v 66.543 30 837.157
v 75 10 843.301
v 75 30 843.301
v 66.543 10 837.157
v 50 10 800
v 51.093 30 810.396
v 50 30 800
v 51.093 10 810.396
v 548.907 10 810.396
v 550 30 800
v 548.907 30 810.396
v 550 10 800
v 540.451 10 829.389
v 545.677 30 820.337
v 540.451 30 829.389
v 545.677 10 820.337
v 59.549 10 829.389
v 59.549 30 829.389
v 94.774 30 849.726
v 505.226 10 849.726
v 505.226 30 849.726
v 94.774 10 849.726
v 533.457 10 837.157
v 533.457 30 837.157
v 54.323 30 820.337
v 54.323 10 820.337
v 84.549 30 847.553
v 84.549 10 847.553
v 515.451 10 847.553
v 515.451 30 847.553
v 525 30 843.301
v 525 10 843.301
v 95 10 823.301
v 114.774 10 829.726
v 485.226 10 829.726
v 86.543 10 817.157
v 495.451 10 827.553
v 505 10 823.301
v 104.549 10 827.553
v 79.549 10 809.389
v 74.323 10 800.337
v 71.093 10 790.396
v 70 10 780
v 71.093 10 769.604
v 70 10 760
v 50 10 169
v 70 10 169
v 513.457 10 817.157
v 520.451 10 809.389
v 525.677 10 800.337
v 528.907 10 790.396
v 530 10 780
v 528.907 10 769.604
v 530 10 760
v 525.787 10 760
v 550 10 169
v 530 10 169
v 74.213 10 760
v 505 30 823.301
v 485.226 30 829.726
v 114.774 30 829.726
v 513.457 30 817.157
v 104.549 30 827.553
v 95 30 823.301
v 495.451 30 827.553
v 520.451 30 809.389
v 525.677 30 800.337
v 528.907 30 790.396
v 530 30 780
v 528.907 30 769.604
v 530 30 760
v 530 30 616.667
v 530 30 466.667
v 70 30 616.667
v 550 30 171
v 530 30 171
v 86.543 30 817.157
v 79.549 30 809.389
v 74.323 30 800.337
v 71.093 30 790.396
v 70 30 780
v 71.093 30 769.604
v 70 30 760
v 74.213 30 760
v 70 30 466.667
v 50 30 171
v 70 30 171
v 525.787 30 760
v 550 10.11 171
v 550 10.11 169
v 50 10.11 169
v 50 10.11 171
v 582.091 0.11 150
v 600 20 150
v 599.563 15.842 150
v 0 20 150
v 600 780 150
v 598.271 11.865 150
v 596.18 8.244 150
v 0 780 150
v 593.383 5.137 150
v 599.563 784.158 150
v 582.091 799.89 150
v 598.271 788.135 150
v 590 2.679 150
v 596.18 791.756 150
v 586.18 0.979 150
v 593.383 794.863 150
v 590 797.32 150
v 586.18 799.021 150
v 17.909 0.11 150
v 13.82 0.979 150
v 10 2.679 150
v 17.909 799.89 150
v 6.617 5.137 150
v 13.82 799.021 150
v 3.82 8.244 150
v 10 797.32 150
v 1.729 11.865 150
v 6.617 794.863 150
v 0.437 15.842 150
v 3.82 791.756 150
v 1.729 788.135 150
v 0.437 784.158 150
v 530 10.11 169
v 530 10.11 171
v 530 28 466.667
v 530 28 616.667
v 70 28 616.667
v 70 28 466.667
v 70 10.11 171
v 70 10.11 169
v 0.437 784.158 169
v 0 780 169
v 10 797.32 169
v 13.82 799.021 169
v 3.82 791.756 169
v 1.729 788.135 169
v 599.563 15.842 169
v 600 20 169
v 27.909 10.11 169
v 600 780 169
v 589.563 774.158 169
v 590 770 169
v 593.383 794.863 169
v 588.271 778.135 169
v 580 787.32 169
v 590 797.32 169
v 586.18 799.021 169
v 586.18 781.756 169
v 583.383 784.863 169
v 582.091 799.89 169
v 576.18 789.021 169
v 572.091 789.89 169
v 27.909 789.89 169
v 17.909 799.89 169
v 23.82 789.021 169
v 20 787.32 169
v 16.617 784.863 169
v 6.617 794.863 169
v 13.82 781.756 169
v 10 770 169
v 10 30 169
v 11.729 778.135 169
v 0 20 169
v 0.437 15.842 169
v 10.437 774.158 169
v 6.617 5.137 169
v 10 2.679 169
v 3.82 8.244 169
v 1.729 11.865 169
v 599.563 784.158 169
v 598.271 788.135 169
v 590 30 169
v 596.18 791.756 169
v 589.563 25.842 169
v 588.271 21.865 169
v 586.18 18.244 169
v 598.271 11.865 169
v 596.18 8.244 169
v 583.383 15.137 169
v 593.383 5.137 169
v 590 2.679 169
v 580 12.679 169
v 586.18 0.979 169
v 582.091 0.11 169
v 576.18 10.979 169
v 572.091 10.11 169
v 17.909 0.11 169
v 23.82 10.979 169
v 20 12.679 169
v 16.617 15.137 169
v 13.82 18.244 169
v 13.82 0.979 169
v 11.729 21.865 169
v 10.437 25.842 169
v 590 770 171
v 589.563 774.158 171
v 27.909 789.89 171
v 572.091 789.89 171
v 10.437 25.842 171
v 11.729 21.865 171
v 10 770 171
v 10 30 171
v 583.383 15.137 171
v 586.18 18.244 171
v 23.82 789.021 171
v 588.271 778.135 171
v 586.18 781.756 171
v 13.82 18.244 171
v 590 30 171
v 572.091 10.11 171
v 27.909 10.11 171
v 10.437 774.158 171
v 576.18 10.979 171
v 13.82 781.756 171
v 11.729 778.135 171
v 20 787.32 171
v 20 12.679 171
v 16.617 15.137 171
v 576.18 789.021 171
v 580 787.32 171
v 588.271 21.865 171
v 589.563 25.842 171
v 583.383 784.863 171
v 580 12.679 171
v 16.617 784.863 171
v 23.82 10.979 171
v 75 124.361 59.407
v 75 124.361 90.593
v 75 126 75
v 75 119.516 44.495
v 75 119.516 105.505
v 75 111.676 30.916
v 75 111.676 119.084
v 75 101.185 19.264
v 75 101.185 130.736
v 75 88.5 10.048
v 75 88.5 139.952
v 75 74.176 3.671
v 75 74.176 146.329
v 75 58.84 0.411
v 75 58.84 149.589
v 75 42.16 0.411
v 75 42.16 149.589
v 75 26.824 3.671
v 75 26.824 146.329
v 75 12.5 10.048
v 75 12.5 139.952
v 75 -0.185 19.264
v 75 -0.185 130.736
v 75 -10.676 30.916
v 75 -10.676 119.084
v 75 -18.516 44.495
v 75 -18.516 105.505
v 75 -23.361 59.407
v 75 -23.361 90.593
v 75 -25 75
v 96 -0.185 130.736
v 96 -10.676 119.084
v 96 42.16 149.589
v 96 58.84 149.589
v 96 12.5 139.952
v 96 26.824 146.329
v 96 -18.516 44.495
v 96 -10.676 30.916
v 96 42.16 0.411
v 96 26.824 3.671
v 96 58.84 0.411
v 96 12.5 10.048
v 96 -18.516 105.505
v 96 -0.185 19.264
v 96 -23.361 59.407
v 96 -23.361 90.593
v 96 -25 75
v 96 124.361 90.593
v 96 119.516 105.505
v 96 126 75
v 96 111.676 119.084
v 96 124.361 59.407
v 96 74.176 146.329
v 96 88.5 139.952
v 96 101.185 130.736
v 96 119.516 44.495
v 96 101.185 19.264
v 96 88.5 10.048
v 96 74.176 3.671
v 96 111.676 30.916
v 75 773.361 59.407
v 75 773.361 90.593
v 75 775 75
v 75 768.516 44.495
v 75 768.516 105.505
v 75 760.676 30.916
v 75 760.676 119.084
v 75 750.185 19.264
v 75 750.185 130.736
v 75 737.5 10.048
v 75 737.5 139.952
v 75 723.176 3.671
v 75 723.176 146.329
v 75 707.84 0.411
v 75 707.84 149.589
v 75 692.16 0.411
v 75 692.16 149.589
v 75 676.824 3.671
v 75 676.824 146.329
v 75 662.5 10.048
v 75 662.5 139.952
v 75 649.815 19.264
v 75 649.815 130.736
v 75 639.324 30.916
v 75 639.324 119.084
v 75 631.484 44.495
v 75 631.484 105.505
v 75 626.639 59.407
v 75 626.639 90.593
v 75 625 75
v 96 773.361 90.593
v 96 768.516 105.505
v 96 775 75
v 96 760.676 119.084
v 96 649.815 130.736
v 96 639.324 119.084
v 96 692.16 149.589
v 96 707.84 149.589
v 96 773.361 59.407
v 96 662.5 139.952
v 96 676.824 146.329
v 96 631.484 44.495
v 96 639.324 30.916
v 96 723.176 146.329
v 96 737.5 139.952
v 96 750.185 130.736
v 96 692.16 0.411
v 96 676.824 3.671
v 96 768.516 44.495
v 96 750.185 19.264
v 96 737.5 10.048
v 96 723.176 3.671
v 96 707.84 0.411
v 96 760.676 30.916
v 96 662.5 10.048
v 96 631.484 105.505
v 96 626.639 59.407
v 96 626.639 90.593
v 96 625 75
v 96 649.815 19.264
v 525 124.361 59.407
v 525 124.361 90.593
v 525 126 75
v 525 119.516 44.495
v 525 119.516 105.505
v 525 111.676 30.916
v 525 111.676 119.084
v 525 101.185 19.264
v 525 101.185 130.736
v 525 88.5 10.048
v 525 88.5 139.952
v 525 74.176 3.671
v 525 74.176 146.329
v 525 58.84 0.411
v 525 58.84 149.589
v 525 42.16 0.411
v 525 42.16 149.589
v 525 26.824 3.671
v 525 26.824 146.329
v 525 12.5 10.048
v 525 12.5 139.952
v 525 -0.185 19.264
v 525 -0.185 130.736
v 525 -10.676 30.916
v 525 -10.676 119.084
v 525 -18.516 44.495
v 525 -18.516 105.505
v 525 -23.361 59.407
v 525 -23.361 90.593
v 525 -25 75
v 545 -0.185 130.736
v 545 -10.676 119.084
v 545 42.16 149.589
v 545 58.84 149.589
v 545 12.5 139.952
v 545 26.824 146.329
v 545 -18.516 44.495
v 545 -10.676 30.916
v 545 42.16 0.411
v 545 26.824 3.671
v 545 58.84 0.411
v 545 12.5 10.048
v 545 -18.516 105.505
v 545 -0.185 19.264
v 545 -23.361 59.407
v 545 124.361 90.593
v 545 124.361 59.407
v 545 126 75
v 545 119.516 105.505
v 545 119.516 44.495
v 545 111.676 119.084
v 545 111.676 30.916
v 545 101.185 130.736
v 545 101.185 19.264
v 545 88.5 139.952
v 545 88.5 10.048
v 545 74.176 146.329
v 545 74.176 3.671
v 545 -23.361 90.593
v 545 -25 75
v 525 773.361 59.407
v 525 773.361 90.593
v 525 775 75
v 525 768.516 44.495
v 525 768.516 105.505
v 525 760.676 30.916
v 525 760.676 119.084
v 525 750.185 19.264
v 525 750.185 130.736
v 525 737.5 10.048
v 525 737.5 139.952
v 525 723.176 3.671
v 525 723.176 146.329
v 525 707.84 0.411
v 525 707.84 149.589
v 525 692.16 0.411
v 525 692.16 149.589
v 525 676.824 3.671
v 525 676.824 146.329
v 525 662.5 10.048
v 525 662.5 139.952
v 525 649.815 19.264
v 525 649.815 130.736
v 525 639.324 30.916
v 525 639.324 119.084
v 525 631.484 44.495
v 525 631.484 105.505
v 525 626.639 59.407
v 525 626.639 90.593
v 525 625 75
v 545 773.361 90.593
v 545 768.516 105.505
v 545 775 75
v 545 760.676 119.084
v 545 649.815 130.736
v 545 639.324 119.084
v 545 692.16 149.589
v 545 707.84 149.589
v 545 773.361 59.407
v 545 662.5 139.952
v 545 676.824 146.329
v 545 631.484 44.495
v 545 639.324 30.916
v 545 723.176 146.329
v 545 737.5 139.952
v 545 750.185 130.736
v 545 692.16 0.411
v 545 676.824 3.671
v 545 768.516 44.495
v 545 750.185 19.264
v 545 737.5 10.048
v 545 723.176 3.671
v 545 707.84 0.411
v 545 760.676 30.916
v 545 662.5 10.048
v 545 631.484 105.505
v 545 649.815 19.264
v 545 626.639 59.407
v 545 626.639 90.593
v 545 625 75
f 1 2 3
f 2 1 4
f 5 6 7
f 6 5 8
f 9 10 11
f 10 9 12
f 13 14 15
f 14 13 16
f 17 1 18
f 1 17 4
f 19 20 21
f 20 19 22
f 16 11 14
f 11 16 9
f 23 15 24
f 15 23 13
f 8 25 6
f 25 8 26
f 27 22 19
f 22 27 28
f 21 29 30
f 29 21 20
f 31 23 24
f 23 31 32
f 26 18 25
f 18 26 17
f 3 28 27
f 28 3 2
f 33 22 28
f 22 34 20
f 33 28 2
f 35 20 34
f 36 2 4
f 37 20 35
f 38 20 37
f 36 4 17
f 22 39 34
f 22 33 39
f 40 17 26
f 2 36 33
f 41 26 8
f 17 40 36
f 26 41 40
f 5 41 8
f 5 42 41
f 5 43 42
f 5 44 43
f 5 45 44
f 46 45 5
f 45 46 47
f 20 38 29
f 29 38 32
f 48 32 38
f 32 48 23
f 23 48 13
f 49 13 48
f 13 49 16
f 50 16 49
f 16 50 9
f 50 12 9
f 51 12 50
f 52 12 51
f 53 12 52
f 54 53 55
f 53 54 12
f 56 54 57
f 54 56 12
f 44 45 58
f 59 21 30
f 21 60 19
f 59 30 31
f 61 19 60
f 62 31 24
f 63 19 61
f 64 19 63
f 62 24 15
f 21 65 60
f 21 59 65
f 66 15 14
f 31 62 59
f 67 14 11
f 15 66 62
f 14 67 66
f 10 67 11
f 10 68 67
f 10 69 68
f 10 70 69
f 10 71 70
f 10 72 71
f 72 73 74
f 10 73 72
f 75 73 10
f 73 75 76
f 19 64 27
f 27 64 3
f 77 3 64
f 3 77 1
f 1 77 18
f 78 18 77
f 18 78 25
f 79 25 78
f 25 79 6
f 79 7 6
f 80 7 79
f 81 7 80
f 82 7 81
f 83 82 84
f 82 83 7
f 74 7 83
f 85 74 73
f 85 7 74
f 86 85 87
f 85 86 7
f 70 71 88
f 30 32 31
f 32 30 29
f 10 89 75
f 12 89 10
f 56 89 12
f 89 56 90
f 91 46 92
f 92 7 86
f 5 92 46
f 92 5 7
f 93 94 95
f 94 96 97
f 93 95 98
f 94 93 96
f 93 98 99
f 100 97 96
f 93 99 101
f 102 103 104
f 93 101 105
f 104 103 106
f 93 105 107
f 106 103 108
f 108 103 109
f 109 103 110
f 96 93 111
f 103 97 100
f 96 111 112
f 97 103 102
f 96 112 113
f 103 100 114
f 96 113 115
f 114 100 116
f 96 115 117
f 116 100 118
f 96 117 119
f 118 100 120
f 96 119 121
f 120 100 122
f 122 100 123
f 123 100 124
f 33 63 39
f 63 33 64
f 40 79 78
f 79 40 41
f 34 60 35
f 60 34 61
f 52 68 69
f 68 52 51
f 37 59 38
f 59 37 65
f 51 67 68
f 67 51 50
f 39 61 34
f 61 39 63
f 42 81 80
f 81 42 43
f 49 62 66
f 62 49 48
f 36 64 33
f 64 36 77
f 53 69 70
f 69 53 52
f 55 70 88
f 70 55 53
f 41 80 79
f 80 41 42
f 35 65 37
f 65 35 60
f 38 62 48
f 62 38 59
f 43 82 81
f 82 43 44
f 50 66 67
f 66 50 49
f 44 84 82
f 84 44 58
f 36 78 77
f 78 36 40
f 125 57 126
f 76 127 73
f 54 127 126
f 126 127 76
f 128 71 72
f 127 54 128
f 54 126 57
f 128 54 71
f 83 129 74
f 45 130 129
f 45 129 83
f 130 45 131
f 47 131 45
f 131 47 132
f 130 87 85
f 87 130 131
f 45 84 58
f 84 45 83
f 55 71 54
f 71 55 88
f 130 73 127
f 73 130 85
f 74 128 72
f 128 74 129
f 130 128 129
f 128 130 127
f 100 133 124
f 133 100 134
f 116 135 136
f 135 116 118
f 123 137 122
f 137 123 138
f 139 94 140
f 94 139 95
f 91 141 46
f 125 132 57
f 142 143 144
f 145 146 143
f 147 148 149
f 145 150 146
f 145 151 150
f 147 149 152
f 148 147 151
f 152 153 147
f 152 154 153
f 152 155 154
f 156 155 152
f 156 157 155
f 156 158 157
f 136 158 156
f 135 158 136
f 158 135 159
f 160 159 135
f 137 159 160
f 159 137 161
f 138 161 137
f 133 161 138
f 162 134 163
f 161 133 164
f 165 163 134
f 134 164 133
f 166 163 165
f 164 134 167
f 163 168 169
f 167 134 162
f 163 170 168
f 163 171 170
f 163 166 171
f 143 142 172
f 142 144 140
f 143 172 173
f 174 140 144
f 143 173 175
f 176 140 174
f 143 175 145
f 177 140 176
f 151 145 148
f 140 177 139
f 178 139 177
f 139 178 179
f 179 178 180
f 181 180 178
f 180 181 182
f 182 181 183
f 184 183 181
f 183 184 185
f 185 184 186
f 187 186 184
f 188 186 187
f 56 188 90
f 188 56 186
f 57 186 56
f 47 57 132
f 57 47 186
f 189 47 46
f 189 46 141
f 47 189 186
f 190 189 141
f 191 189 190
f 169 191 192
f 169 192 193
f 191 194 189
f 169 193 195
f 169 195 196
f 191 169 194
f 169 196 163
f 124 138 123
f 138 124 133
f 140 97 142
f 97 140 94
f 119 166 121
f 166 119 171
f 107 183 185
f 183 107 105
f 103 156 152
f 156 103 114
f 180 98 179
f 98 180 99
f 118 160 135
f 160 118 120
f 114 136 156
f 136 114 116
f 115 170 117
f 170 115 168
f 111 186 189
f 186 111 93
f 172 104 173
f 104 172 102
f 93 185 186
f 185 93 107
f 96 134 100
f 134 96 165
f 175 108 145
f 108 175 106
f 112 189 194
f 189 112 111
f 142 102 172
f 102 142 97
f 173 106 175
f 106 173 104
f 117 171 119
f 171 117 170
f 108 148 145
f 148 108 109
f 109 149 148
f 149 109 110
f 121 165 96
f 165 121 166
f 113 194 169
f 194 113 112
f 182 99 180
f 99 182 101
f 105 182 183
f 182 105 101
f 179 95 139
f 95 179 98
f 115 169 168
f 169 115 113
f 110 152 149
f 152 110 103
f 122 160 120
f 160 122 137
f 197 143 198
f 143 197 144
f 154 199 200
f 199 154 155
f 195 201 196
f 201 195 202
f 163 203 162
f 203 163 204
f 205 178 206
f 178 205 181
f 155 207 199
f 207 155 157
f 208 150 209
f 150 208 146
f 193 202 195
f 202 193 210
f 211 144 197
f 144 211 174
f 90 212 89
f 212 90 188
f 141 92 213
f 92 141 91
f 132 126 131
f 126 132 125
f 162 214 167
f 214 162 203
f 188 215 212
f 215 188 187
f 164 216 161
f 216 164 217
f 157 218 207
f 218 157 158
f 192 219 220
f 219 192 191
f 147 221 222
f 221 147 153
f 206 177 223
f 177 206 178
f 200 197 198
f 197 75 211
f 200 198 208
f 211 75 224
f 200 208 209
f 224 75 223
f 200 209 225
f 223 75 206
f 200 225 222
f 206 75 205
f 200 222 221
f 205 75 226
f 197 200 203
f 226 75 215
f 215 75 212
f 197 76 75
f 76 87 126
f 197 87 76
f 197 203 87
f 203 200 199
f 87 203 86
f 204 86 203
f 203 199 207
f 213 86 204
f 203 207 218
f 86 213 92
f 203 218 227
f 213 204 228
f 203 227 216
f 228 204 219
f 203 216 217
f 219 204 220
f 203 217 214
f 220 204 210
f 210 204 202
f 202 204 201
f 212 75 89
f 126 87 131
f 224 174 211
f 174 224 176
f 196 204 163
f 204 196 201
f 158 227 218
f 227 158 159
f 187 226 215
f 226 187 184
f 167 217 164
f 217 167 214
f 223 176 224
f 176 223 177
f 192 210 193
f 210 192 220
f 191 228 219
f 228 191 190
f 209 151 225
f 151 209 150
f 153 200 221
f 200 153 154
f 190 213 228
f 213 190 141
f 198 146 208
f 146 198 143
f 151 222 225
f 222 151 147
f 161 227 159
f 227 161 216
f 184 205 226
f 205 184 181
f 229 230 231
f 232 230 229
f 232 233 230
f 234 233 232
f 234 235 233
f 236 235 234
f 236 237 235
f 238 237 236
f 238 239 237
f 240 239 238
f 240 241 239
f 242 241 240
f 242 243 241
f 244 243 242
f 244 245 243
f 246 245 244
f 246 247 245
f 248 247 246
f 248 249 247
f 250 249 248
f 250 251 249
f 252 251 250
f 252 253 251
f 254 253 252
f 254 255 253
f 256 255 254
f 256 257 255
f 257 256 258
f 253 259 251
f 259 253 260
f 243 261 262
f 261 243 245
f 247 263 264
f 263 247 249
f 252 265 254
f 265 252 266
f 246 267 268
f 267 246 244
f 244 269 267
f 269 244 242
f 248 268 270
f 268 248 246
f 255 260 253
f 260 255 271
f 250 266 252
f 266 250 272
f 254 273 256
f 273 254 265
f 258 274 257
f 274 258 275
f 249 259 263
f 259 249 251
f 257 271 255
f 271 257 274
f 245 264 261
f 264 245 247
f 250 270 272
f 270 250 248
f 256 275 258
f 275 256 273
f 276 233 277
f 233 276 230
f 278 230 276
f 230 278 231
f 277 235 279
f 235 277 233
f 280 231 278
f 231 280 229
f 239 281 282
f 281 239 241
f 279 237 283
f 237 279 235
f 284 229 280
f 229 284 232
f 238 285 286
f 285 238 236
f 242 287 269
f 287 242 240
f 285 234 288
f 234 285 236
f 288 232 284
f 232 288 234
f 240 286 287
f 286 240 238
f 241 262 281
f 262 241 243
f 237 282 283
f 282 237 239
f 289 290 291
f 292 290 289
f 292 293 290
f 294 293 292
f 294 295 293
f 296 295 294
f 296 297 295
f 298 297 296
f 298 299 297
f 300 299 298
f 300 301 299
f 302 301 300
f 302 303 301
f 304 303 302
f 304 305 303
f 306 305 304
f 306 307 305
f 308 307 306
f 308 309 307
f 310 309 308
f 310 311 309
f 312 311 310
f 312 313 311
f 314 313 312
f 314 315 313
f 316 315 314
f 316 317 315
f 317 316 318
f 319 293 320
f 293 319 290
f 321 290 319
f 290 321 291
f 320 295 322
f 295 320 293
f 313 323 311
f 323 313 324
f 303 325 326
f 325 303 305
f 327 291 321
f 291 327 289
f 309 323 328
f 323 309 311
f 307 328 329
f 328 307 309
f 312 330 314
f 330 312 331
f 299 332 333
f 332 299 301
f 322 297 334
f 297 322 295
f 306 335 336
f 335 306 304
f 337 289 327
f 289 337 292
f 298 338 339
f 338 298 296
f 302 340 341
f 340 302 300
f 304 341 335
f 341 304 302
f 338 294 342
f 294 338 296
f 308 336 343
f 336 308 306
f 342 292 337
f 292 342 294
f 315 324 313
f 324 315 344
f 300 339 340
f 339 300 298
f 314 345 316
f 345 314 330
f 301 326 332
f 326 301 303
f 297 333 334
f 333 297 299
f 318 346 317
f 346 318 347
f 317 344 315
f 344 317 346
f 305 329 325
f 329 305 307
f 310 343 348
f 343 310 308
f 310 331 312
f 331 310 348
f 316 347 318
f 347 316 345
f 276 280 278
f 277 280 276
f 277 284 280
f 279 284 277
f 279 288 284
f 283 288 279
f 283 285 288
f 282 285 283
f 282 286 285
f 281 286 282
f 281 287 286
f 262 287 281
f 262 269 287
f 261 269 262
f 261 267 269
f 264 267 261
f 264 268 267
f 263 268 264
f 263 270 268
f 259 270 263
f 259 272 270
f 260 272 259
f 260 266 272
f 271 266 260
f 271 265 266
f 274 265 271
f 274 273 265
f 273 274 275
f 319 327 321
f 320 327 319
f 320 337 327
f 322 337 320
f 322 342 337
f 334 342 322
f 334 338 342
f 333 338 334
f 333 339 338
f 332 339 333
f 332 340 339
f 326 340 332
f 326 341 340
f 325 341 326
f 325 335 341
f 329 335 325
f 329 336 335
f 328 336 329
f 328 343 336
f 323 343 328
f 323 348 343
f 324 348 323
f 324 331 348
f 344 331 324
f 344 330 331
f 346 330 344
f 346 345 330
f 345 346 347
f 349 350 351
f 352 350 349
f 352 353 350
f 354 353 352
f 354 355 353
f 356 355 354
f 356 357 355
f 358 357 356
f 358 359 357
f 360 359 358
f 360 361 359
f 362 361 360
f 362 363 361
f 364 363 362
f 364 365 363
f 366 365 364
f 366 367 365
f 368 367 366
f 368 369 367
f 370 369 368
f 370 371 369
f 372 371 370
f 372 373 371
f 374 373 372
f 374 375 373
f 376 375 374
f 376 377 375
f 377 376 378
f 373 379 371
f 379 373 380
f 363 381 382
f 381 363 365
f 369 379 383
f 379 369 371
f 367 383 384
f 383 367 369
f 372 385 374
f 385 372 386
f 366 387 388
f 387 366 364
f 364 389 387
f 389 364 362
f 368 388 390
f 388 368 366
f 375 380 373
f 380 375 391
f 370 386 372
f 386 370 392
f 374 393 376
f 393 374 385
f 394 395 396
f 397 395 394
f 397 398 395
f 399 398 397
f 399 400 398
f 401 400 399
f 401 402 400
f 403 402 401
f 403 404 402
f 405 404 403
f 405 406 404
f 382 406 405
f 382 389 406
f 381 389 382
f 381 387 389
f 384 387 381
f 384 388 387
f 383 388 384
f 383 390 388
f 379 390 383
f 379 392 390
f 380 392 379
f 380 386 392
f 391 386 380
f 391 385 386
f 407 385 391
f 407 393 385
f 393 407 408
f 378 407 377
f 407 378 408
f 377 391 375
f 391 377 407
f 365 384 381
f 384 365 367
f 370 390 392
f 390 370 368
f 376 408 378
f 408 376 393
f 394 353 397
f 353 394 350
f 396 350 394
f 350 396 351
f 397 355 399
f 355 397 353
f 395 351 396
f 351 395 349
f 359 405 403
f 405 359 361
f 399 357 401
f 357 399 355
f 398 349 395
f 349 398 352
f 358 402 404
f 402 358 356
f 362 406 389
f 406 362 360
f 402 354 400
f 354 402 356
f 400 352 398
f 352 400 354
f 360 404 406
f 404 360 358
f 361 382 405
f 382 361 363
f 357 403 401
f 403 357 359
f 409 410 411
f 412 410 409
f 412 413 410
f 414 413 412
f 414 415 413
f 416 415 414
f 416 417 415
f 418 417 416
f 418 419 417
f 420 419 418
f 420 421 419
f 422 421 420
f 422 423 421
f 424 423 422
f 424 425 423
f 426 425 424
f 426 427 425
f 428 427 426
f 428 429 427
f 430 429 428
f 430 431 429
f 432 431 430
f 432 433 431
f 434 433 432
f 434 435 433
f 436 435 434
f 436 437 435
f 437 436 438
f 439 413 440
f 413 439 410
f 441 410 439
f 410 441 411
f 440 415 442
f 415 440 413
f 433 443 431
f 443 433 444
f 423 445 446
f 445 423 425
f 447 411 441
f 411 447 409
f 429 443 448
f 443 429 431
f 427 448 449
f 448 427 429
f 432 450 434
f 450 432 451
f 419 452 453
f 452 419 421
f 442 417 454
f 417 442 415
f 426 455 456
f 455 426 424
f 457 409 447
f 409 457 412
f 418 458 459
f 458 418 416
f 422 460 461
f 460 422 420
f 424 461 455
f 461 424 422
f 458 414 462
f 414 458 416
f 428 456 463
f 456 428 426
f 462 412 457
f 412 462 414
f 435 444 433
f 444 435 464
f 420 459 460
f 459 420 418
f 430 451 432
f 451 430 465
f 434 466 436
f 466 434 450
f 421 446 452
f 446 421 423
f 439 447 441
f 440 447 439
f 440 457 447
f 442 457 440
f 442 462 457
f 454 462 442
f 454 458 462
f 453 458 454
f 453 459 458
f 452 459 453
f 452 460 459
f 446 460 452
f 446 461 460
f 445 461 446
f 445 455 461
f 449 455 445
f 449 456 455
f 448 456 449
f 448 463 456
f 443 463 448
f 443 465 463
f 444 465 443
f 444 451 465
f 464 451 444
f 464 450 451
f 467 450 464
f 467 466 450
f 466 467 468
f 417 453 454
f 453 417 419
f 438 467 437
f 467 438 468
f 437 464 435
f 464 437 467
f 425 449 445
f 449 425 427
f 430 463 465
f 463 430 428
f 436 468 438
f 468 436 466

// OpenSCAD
/**
rad=75;

height_tire = rad*2;

**/
daisha(600,800, 700, 75);

module daisha(width,length, height, rad){
  color("silver") translate([width/2,30,rad*2]) rotate([90,0,0]) handle(width-100, height);
  translate([0,0,rad*2]) daisha_base(width, length);
  tires(width, length, rad);
}

module tires(width, length, h_tire){
  color("black")
    //tire
  for(x=[0, 1, width-150], y=[0,1,length-h_tire-75]){
    translate([x+h_tire, y+50, h_tire])rotate([90,0,90])cylinder(r=h_tire, h=20);
  }
}

module daisha_base(width, length){
  color("dimgray")
  hull(){
  for(x=[0,1,width-40], y = [0,1,length-40]){
      translate([x+20, y+20, 0])cylinder(r=20, h=19);
  }
  }
  color("blue")
  hull(){
  for(x=[0,1,width-60], y = [0,1,length-60]){
      translate([x+30, y+30, 1])cylinder(r=20, h=20);
  }
  }
}

module handle(width, height){
  difference(){
    union(){
      hull(){
        translate([width/2-50, height-50, 0])cylinder(r=50, h=20);
        translate([-(width/2)+50, height-50, 0])cylinder(r=50, h=20);
      }
      translate([-width/2,0,0]) cube([width, height-50, 20]);
      }
  union(){
    hull(){
      translate([width/2-70, height-70, -1])cylinder(r=50, h=22);
      translate([-(width/2)+70, height-70, -1])cylinder(r=50, h=22);
    }
    translate([-(width-40)/2,-20,-1]) cube([width-40, height-70, 22]);
  }
  }
  translate([-width/2,height*2/3,0])rotate([90,0,0])cube([width, 2, 150]);
}
